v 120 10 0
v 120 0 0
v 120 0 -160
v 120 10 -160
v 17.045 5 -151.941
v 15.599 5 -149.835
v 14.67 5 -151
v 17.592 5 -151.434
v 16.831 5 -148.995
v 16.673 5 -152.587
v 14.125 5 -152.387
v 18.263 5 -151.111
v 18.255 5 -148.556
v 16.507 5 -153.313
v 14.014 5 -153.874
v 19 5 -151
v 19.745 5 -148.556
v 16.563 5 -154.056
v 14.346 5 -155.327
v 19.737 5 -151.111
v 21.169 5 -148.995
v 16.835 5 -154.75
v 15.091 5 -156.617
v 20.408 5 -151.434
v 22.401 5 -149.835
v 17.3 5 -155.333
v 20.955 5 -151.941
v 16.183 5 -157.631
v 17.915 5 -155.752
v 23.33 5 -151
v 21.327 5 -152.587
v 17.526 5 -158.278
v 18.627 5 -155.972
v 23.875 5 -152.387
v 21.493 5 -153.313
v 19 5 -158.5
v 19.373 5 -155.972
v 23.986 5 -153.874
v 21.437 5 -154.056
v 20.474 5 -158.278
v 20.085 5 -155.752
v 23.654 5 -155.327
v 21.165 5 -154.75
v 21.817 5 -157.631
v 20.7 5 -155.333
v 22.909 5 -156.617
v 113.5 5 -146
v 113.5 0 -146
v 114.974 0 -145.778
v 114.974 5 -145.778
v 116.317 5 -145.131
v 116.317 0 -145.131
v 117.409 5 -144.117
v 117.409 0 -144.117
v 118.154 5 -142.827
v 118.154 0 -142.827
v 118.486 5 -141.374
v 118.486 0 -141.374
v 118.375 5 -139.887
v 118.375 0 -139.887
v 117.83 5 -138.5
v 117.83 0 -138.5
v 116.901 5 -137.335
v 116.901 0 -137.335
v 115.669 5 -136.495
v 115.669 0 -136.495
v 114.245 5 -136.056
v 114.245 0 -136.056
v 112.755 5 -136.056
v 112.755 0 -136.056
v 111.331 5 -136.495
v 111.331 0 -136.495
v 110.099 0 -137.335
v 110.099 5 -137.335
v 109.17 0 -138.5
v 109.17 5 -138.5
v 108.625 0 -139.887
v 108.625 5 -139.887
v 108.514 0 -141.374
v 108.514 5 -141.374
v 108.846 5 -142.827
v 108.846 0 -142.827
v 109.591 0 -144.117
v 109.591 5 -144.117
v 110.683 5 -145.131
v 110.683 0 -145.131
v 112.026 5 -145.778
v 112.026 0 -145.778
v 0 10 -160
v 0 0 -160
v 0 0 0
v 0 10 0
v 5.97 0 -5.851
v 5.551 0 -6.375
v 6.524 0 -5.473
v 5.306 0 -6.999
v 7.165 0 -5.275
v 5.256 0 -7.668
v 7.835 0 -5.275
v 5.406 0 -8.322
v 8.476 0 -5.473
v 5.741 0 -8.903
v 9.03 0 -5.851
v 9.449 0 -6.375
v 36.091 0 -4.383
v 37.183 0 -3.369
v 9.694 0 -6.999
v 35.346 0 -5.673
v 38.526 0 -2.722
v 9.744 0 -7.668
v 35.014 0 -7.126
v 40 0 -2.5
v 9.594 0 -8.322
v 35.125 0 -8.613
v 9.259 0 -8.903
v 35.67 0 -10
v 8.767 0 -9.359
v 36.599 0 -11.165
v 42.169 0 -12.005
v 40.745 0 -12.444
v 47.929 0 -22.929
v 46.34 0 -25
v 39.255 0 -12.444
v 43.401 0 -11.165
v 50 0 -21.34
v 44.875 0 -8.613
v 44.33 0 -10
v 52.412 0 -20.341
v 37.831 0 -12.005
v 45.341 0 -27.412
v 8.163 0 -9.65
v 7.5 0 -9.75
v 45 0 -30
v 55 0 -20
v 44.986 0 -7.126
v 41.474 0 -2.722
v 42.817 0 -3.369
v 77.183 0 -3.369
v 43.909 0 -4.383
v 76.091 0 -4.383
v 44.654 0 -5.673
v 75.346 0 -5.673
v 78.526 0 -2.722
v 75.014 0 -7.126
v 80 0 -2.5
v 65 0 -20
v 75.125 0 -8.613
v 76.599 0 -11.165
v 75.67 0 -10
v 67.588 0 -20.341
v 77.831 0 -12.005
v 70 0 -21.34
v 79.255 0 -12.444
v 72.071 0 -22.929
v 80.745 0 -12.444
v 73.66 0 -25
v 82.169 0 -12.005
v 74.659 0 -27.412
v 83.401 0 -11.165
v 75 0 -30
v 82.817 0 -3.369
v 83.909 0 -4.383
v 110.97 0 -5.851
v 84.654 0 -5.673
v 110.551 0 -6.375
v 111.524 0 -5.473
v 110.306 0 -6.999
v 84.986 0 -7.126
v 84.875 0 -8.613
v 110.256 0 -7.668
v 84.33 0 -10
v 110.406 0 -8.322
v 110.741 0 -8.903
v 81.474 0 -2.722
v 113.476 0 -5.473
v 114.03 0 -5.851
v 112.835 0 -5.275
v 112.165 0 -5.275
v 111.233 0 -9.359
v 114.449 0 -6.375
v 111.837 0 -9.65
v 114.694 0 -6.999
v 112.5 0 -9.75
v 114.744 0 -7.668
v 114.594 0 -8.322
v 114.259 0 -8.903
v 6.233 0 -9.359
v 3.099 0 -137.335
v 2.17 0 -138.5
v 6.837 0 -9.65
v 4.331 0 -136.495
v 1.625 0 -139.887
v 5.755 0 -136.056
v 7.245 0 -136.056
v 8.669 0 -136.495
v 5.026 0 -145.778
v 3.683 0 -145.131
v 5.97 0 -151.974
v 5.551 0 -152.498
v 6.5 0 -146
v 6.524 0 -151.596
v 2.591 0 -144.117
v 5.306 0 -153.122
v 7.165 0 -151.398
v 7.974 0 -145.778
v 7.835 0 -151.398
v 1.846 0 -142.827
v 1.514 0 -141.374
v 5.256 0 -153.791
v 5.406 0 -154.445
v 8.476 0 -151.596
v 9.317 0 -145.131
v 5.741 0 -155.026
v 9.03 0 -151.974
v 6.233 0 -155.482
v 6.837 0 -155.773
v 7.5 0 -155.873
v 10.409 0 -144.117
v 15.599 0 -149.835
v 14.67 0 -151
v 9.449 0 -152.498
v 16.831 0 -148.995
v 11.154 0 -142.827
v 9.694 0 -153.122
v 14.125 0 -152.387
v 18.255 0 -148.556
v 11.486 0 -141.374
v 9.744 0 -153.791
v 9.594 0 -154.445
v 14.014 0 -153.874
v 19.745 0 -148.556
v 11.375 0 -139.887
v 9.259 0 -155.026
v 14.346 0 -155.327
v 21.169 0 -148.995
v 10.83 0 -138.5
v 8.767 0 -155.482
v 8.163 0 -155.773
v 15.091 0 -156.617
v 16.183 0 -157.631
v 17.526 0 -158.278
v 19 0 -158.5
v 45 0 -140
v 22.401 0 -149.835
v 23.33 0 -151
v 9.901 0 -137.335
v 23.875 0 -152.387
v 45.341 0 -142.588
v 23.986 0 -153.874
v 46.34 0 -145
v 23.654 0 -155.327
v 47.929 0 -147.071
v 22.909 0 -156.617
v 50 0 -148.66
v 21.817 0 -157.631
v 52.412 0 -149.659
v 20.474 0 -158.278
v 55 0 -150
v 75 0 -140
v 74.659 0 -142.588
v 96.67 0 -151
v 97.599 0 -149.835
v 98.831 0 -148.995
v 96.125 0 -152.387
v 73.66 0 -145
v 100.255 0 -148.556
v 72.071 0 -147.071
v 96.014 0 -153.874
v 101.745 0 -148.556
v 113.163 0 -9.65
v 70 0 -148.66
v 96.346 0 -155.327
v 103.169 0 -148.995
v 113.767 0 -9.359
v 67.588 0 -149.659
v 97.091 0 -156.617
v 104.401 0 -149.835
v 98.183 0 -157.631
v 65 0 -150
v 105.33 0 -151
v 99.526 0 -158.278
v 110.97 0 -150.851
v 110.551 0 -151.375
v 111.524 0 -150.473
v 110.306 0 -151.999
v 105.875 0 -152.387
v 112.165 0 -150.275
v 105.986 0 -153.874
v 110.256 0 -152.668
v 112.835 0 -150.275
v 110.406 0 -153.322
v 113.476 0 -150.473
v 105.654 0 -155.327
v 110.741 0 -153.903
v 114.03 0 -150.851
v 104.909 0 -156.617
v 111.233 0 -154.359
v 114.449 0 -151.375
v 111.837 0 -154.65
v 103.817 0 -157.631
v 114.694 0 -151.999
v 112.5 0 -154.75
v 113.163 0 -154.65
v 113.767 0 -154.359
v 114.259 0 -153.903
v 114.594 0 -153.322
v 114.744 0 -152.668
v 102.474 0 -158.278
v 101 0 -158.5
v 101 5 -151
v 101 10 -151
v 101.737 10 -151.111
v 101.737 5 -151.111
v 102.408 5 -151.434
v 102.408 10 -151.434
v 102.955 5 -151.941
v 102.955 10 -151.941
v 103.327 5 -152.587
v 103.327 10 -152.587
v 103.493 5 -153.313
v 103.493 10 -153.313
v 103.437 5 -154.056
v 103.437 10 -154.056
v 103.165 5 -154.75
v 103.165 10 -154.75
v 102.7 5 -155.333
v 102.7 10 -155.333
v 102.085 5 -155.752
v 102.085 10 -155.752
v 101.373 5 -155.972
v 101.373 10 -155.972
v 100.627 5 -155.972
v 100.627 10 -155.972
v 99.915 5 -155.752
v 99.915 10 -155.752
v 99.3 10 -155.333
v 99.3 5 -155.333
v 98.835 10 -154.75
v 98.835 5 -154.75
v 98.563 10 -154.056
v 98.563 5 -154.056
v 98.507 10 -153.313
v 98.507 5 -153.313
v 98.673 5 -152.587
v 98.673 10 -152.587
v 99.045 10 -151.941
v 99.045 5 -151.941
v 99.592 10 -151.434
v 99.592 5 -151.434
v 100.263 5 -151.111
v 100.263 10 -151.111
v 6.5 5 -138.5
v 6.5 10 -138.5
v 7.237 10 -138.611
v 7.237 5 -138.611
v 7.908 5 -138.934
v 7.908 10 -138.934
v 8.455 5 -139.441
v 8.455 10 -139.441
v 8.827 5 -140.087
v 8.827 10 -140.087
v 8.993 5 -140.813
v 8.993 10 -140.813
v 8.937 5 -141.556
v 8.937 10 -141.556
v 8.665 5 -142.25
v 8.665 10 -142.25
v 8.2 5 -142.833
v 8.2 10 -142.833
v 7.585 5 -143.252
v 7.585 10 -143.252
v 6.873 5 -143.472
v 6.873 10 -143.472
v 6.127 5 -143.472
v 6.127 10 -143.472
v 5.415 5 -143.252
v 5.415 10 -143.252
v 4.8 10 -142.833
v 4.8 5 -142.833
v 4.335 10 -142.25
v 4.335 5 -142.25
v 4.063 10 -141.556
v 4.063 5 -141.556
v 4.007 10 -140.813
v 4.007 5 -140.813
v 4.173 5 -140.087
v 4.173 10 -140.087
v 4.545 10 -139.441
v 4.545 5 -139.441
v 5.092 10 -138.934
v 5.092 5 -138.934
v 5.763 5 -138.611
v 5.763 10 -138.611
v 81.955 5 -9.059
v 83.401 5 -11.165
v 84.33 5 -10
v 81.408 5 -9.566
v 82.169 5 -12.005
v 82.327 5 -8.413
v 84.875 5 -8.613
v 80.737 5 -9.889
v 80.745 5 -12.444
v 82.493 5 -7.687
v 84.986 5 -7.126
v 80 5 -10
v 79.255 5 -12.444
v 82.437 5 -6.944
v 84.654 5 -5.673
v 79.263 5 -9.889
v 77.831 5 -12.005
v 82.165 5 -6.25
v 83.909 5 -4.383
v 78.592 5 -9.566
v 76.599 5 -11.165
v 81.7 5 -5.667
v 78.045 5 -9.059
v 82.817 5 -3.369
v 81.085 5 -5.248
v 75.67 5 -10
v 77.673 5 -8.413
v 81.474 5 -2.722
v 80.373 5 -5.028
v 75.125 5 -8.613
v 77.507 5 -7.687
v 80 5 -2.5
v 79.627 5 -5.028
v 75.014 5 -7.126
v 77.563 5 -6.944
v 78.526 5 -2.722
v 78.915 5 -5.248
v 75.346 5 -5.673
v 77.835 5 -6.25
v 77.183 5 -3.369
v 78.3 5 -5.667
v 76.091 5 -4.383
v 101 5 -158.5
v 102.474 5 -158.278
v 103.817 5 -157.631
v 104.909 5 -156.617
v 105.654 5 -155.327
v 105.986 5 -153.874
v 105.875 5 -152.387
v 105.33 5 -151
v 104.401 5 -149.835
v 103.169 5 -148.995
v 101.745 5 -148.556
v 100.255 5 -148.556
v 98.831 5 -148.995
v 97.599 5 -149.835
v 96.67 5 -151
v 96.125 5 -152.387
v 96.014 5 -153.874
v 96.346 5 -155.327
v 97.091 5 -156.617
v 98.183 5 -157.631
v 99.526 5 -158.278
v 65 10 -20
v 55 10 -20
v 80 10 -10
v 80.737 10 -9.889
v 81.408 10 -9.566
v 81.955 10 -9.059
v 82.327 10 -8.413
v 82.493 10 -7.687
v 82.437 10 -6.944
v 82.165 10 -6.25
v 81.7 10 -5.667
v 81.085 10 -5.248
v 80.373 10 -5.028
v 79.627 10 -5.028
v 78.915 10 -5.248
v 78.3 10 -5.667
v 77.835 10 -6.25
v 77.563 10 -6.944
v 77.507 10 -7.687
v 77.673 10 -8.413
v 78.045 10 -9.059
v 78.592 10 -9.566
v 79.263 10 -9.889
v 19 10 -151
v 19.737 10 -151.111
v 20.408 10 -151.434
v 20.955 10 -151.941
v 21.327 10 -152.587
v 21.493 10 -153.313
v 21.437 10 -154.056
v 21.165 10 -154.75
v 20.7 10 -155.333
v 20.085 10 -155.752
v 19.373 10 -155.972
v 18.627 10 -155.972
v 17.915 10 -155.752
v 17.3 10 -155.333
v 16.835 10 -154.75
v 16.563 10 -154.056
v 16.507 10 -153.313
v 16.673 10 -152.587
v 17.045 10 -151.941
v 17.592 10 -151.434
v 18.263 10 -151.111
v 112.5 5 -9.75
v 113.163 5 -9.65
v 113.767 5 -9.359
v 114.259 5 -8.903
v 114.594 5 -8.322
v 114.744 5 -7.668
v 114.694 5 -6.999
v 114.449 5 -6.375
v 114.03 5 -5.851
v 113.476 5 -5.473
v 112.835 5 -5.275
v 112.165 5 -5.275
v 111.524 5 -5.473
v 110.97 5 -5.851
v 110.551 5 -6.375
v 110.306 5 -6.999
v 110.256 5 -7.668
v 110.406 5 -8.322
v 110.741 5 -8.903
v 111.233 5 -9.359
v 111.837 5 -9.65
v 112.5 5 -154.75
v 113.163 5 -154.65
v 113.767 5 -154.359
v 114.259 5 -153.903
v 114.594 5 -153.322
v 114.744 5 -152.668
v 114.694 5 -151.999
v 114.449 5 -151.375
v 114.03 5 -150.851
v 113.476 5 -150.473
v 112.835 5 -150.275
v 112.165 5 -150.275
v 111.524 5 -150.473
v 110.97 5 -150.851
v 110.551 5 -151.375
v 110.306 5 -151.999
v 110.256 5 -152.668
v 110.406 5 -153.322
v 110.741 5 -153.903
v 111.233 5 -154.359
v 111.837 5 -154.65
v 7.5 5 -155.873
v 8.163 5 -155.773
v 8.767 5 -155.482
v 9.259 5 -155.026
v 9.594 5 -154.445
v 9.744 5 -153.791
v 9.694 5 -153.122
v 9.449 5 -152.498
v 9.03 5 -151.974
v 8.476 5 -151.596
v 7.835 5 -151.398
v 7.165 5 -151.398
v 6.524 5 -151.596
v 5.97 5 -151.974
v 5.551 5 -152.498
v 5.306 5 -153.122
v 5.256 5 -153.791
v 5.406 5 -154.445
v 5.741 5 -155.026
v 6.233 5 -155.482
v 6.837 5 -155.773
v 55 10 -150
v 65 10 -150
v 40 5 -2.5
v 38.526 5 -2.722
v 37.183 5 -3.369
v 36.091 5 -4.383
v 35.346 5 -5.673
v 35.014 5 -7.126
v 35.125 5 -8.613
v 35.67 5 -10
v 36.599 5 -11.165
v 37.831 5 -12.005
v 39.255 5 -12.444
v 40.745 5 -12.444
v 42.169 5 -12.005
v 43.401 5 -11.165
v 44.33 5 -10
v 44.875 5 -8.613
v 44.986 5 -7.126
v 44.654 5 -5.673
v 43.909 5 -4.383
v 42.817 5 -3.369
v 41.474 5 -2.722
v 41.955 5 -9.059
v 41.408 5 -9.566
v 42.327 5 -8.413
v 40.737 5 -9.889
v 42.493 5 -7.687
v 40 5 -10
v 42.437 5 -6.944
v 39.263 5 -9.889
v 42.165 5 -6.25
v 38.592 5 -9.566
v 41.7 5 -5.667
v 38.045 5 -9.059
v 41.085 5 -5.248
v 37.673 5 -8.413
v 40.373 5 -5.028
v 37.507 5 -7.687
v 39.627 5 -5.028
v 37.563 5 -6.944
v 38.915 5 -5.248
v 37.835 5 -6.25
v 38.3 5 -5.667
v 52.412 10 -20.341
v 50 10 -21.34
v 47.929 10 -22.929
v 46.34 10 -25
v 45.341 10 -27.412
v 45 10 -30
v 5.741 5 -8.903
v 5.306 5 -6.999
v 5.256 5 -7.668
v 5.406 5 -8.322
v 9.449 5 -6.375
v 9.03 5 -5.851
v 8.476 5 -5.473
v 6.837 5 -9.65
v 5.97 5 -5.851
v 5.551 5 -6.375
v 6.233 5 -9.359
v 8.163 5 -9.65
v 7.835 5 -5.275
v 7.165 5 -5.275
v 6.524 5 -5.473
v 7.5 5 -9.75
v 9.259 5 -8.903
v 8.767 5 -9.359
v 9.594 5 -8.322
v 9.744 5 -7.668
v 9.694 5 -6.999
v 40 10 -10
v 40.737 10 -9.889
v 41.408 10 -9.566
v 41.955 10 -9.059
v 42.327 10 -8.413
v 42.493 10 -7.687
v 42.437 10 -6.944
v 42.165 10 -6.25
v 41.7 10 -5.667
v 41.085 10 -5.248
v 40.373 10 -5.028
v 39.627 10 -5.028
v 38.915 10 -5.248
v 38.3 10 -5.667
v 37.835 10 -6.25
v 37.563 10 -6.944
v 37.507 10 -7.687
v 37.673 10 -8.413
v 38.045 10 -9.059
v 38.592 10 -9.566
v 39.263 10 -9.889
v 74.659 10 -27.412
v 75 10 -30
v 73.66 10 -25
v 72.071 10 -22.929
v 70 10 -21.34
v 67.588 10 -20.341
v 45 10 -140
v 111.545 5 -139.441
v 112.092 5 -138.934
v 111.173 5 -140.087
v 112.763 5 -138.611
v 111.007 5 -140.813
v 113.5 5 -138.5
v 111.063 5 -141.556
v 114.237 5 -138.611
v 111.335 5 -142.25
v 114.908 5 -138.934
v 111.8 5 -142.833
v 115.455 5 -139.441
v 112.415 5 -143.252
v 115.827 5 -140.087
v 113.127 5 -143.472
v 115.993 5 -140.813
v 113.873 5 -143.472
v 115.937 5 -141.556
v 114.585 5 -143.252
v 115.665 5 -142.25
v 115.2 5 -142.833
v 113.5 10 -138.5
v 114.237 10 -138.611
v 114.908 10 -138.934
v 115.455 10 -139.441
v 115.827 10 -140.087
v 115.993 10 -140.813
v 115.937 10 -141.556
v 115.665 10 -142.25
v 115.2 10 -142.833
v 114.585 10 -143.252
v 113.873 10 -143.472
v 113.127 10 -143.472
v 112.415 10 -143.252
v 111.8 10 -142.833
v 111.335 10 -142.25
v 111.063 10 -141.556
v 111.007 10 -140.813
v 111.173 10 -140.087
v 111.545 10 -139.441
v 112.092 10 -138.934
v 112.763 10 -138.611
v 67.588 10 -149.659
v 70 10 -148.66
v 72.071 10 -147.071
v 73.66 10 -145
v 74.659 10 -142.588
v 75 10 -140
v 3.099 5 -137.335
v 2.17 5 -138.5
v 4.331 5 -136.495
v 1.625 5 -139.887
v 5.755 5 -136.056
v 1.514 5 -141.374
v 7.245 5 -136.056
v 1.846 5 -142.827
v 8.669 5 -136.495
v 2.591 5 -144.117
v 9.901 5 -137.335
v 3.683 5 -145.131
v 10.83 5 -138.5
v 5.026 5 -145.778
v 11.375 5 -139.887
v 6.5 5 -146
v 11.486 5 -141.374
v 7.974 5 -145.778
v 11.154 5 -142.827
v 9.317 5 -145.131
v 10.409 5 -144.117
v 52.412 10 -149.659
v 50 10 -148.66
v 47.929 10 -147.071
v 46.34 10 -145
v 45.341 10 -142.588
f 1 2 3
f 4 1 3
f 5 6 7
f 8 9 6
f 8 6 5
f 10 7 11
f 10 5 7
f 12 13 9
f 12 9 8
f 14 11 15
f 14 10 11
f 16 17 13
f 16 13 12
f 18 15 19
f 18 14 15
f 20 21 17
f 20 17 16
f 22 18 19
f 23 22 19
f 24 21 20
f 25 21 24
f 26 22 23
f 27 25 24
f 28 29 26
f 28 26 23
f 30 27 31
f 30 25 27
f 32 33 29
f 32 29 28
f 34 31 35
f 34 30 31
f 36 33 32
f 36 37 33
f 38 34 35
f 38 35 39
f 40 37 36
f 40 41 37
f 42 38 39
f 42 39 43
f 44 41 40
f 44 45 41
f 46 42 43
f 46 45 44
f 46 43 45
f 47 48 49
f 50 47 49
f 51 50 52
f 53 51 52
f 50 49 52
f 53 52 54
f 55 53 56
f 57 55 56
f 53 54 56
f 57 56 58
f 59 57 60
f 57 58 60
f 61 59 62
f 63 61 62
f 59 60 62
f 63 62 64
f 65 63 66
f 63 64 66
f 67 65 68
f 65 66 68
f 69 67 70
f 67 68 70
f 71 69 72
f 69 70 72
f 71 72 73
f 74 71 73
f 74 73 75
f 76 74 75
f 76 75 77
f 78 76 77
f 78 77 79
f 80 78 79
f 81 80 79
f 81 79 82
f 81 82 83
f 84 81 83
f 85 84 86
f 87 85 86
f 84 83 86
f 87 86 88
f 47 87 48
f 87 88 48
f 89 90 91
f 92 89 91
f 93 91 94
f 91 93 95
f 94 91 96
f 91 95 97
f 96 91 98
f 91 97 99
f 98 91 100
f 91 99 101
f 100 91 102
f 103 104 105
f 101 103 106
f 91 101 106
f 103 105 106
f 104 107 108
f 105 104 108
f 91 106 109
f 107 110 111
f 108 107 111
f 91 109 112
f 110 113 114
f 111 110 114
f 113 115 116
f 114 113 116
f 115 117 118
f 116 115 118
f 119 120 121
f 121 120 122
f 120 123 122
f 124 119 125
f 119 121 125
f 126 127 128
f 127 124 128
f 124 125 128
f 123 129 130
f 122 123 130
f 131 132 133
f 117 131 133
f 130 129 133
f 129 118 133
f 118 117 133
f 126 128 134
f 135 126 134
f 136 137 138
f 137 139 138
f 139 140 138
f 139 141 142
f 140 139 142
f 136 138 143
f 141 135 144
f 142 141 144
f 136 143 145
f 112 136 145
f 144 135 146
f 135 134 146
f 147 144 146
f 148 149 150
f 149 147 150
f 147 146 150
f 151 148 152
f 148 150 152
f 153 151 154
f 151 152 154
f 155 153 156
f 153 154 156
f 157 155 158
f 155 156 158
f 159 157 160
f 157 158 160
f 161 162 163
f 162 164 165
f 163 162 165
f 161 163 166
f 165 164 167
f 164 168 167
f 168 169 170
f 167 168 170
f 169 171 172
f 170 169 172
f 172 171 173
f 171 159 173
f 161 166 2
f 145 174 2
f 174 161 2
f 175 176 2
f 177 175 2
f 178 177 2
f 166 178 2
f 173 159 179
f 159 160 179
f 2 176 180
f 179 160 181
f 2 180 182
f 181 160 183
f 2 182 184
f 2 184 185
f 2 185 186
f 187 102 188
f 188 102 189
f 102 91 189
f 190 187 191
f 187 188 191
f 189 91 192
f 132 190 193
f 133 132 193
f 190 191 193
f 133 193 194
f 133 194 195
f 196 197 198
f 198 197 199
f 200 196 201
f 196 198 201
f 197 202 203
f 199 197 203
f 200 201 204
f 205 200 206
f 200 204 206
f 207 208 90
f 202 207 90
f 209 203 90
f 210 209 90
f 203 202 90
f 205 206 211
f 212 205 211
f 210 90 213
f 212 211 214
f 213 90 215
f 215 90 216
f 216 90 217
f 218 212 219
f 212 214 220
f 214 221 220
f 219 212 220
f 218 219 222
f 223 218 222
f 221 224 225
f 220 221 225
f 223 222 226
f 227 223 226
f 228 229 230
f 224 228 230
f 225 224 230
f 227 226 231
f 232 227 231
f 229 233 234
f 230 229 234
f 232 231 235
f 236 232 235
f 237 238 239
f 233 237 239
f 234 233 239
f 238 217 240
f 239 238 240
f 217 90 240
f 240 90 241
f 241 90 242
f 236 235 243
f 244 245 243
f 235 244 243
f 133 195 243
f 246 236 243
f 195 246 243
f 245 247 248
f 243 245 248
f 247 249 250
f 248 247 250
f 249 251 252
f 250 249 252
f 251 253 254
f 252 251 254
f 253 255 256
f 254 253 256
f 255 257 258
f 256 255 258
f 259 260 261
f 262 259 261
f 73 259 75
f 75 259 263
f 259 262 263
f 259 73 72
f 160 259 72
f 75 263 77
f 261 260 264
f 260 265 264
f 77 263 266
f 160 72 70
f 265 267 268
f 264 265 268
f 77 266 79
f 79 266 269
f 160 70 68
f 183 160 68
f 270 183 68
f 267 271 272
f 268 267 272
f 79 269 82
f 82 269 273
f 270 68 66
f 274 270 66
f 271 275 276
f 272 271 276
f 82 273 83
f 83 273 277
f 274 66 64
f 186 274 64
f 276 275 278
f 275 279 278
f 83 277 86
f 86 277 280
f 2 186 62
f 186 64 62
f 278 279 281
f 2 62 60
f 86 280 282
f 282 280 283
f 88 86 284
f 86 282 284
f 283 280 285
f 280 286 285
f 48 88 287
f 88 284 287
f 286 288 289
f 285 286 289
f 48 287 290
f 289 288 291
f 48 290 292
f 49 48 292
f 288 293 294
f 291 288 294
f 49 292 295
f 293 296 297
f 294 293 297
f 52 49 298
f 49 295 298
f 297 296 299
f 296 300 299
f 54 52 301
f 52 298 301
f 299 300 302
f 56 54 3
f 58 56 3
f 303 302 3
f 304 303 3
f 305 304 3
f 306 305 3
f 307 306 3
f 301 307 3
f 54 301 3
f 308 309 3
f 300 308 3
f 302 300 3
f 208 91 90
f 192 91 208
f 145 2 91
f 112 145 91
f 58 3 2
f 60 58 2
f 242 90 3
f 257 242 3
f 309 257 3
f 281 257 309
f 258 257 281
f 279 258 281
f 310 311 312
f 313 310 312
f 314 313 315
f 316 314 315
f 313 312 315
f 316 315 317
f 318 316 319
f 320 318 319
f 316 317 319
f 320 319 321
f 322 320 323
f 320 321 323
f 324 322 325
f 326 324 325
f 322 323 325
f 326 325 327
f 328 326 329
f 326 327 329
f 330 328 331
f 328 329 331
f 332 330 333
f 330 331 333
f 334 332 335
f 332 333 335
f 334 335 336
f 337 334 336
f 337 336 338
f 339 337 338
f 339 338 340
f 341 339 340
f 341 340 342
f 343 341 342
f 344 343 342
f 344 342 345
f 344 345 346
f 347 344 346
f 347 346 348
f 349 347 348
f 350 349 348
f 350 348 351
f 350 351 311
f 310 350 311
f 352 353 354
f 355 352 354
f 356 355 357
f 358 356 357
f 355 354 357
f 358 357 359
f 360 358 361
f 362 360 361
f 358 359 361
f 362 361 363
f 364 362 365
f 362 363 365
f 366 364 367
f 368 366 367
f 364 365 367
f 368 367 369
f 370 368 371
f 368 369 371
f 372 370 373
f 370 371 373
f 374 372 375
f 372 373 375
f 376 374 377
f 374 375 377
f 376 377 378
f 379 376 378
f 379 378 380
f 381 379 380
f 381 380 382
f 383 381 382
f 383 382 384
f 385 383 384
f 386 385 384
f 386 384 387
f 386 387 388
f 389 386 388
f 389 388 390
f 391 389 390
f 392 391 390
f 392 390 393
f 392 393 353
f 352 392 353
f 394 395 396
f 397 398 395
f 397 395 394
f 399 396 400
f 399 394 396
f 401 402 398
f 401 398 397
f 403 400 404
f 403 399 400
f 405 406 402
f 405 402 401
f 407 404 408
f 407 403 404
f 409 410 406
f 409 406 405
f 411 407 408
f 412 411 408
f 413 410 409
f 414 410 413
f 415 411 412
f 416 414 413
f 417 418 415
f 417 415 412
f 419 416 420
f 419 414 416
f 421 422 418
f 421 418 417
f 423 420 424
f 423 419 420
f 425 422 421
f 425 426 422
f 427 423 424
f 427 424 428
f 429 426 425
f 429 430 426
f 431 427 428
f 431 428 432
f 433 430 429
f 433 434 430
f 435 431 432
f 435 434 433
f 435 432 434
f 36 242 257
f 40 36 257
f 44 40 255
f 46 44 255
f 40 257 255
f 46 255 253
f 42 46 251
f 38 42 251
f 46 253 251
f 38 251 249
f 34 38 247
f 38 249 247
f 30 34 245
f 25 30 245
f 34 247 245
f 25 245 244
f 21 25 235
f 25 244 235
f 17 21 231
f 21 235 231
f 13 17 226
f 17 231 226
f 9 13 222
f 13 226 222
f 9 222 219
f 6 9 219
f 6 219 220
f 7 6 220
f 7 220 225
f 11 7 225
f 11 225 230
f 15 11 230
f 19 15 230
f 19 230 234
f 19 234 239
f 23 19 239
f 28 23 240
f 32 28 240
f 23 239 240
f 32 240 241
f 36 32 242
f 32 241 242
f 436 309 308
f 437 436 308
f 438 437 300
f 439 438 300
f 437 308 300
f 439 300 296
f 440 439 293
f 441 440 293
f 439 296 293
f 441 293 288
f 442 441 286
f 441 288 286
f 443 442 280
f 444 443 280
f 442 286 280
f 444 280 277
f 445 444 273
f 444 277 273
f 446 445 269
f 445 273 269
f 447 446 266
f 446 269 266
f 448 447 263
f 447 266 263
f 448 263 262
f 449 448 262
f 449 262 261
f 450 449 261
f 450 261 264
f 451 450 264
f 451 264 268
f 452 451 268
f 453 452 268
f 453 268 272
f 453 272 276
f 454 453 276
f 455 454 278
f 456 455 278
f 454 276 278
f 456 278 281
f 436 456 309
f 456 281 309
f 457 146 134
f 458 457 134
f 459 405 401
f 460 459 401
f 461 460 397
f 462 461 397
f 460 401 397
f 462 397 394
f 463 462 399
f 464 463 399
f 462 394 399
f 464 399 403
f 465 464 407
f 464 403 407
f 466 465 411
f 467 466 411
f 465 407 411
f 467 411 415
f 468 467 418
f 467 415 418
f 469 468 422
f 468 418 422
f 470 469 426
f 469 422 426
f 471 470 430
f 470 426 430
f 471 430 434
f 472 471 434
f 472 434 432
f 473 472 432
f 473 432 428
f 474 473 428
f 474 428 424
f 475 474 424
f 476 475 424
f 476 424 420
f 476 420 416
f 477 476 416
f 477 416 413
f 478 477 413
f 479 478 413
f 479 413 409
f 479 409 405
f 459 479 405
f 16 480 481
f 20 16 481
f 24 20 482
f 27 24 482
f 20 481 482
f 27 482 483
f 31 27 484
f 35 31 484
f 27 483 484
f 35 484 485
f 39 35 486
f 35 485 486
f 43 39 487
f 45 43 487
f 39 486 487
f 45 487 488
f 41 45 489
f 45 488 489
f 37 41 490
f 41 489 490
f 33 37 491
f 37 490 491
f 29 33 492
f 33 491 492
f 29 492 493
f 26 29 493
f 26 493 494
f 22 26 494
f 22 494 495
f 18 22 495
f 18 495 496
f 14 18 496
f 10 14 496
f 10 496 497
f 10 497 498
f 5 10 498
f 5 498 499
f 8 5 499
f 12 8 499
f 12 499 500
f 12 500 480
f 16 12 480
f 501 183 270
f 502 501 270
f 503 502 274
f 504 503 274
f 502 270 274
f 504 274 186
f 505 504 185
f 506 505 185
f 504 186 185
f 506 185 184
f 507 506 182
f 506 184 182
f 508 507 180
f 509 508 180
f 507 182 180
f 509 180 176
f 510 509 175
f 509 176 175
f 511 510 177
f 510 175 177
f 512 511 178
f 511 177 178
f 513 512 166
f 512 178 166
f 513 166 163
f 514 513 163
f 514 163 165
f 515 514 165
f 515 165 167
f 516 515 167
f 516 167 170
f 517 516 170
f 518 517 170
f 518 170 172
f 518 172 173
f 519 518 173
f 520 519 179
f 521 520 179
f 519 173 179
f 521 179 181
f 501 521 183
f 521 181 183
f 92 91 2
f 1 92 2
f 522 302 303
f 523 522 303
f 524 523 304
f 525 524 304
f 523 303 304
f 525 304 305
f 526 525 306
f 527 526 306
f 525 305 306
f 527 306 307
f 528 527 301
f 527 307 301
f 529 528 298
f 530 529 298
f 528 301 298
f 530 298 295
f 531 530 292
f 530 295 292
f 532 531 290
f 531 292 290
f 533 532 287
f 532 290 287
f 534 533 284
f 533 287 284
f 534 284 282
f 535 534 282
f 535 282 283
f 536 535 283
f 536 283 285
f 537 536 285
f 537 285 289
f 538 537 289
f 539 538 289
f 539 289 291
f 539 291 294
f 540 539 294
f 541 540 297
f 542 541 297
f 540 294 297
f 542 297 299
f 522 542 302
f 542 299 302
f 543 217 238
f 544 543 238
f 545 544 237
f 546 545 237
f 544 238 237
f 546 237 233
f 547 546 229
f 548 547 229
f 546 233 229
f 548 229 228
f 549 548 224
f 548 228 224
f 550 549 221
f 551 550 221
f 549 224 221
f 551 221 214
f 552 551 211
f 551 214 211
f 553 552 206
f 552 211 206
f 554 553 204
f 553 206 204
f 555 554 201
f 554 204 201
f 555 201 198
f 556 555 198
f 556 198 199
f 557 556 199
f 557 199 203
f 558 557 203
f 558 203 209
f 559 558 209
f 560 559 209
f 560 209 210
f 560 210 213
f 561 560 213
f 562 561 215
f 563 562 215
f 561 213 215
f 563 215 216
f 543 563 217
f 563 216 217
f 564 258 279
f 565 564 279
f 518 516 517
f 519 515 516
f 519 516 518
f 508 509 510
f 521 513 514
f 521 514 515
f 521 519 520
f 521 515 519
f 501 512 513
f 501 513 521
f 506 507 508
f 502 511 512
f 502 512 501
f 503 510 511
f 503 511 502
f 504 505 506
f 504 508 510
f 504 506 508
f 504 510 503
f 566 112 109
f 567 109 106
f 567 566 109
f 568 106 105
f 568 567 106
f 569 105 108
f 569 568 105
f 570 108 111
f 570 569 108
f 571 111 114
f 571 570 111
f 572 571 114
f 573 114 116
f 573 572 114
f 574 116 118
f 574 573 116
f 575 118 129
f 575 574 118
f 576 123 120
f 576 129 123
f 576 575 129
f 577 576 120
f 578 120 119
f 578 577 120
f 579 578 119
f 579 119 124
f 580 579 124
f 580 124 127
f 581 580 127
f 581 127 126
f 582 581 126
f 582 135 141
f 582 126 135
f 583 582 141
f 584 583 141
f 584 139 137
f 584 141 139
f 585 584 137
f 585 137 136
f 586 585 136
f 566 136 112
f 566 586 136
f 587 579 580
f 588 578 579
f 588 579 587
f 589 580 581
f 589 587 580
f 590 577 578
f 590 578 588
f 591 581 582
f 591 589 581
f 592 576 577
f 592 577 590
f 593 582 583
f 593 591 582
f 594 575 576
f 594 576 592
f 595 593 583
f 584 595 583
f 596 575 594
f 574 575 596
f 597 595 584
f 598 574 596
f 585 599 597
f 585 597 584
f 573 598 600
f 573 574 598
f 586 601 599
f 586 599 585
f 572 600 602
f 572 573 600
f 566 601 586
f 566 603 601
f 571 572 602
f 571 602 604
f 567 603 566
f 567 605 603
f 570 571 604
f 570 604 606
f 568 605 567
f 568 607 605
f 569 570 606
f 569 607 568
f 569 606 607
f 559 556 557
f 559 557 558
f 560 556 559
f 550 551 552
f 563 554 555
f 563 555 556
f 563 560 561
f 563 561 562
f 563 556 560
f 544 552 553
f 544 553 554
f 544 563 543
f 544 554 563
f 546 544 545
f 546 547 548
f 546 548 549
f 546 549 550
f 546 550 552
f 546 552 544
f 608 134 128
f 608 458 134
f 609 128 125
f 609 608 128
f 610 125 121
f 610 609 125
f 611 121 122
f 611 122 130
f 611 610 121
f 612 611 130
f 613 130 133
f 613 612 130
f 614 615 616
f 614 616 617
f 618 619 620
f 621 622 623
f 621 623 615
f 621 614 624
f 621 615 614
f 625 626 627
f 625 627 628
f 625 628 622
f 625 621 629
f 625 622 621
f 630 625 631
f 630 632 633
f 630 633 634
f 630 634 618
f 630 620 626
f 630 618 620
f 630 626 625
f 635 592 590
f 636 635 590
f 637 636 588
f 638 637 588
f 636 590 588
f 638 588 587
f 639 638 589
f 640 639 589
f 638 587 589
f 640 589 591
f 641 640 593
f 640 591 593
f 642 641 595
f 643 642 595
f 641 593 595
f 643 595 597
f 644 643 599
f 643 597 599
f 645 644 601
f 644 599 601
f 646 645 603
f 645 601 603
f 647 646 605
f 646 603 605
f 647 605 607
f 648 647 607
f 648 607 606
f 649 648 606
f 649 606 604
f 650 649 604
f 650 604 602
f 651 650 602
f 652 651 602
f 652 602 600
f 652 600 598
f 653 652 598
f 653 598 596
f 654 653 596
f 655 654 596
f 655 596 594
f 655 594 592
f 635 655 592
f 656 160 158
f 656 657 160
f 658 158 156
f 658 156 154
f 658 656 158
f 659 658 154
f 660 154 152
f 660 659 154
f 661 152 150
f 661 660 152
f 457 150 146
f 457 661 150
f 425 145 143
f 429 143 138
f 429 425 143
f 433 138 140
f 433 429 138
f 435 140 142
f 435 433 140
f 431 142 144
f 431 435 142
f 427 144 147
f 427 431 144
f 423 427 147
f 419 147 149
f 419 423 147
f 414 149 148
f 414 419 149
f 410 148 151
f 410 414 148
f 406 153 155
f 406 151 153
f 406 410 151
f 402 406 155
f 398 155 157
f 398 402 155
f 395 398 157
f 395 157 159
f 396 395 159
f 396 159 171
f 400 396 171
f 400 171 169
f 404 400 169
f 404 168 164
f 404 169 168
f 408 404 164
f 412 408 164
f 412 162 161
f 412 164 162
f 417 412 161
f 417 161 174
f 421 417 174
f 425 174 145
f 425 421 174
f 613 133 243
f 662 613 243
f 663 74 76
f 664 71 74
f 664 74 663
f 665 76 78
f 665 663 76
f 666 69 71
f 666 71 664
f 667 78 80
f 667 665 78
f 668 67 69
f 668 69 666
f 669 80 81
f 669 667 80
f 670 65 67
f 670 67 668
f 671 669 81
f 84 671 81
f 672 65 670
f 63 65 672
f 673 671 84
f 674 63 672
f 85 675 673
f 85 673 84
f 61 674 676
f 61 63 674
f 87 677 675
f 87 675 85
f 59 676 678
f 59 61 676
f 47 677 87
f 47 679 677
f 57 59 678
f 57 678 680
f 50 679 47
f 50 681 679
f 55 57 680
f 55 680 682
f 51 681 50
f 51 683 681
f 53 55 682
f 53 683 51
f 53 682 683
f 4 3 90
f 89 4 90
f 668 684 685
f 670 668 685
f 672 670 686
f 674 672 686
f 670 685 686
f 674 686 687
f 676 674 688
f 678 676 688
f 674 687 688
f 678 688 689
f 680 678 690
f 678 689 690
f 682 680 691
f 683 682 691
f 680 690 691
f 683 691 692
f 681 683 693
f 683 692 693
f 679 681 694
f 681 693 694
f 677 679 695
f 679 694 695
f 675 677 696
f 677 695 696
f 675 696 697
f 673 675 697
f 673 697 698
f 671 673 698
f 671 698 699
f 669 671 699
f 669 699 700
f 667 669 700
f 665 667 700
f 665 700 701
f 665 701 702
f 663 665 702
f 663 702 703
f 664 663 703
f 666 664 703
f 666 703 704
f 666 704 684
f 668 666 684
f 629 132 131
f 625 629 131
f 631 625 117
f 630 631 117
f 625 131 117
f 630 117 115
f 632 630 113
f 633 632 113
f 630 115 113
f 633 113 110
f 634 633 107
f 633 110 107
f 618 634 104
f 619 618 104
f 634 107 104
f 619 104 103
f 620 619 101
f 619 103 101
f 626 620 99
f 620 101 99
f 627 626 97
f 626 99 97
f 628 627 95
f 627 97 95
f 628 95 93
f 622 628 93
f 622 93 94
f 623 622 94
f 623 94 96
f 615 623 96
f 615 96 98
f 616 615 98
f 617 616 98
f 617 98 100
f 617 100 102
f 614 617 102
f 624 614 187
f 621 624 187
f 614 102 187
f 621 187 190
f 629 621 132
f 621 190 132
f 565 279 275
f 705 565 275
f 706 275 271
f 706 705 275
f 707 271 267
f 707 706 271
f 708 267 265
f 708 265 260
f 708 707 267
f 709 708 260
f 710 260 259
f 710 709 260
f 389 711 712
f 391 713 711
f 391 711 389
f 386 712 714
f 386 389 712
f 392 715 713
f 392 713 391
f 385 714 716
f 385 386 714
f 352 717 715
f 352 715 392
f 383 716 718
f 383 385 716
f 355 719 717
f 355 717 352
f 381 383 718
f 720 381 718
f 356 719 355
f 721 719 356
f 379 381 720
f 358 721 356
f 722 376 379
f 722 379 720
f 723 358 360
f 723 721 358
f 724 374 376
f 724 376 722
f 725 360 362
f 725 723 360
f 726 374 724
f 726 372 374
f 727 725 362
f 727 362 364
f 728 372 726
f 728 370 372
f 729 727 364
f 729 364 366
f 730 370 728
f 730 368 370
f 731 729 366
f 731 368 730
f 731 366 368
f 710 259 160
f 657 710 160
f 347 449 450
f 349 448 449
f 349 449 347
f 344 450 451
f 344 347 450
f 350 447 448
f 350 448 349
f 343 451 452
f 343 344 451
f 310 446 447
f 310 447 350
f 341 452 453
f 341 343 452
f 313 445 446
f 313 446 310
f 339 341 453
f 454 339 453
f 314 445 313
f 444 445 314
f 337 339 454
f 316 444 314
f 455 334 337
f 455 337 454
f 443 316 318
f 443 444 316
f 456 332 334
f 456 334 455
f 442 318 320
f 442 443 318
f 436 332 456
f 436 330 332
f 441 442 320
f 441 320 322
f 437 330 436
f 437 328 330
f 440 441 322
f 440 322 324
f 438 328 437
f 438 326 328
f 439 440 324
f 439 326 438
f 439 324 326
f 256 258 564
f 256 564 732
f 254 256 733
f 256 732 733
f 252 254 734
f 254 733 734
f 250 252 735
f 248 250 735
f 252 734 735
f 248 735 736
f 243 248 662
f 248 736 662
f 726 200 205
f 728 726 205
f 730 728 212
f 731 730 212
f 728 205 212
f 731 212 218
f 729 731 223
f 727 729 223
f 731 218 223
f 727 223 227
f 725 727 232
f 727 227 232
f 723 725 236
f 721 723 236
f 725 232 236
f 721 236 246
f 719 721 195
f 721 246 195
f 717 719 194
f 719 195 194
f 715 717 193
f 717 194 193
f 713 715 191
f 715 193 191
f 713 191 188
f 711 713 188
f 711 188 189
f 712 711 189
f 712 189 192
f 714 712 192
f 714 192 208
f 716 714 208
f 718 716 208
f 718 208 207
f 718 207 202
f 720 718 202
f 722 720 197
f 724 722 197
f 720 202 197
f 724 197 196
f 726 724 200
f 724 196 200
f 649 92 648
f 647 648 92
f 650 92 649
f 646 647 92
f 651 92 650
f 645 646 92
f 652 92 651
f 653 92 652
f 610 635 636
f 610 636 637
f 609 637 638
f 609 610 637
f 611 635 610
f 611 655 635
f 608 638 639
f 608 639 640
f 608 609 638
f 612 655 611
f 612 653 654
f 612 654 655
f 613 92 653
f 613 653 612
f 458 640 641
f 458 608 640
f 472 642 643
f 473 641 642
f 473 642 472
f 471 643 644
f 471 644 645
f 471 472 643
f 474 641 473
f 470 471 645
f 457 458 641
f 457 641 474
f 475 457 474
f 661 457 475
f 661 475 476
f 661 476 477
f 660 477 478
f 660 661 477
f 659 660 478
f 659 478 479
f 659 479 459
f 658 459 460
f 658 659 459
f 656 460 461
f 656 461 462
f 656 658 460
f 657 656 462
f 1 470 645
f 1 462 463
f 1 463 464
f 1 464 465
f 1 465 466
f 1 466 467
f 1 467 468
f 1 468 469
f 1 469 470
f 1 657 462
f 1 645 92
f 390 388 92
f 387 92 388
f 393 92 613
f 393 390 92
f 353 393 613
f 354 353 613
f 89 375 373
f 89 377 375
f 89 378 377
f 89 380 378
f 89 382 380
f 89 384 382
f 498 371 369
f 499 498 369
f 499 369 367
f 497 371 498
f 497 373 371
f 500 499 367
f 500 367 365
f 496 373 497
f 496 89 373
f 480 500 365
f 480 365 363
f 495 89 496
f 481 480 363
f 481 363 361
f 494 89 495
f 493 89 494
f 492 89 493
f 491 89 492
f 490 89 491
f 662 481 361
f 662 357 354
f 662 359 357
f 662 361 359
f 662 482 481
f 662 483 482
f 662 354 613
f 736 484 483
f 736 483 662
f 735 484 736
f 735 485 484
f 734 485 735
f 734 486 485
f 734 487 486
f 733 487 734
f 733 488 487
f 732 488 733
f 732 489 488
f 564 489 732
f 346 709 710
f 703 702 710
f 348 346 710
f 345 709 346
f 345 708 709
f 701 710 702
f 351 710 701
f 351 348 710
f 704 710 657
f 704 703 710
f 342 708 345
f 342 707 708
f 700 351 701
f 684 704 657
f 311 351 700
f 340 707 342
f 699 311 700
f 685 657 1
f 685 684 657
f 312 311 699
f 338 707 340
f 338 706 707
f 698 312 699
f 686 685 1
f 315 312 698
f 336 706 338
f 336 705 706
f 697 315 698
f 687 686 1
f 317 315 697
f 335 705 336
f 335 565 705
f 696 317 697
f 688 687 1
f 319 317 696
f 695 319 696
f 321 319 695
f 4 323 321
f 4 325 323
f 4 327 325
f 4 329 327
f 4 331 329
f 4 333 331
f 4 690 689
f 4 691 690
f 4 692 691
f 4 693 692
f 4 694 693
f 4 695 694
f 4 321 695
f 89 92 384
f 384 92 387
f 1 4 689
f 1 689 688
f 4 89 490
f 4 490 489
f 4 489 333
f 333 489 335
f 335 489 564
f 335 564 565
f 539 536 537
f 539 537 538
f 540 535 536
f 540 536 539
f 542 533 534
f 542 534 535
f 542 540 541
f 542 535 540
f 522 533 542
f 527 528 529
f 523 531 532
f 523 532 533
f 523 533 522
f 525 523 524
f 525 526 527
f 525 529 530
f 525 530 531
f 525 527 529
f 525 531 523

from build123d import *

# Parameters (mm, degrees)
BOSS_EXTRUDE3_DEPTH = 10
FILLET3_R           = 10
SKETCH2_R           = 2.5
CUT_EXTRUDE1_DEPTH  = 100
SKETCH3_R           = 2.5
CUT_EXTRUDE3_DEPTH  = 100
SKETCH4_R           = 5
CUT_EXTRUDE4_DEPTH  = 5
SKETCH5_R           = 2.25
CUT_EXTRUDE7_DEPTH  = 5
SKETCH8_R           = 2.25
CUT_EXTRUDE8_DEPTH  = 5
SKETCH9_R           = 2.25
CUT_EXTRUDE9_DEPTH  = 5
SKETCH10_R          = 5
CUT_EXTRUDE13_DEPTH = 12
SKETCH12_R          = 2.5
CUT_EXTRUDE14_DEPTH = 12


with BuildPart() as part:
    # Sketch1 → Boss-Extrude3 (new body)
    with BuildSketch(Plane(origin=(0, 0, 0), x_dir=(1, 0, 0), z_dir=(0, 1, 0))):
        Polygon((60, 150), (60, 160), (0, 160), (0, 80), (45, 80), (45, 150), align=None)
        Polygon((120, 160), (60, 160), (60, 150), (75, 150), (75, 80), (120, 80), align=None)
        Polygon((120, 0), (120, 80), (75, 80), (75, 20), (60, 20), (60, 0), align=None)
        Polygon((45, 80), (0, 80), (0, 0), (60, 0), (60, 20), (45, 20), align=None)
    extrude(amount=BOSS_EXTRUDE3_DEPTH)

    # Fillet3
    fillet3_edges = [part.edges().sort_by_distance(p)[0] for p in [
        (75, 5, -150),
        (45, 5, -150),
        (45, 5, -20),
        (75, 5, -20),
    ]]
    fillet(fillet3_edges, radius=FILLET3_R)

    # Sketch2 → Cut-Extrude1 (cut)
    with BuildSketch(Plane(origin=(0, 10, 0), x_dir=(1, 0, 0), z_dir=(0, 1, 0))):
        with Locations(Location((19, 153.5, 0), (0, 0, 270))):
            Circle(SKETCH2_R)
        with Locations(Location((6.5, 141, 0), (0, 0, 270))):
            Circle(SKETCH2_R)
    extrude(amount=-CUT_EXTRUDE1_DEPTH, mode=Mode.SUBTRACT)

    # Sketch3 → Cut-Extrude3 (cut)
    with BuildSketch(Plane(origin=(0, 10, 0), x_dir=(1, 0, 0), z_dir=(0, 1, 0))):
        with Locations(Location((113.5, 141, 0), (0, 0, 270))):
            Circle(SKETCH3_R)
        with Locations(Location((101, 153.5, 0), (0, 0, 270))):
            Circle(SKETCH3_R)
    extrude(amount=-CUT_EXTRUDE3_DEPTH, mode=Mode.SUBTRACT)

    # Sketch4 → Cut-Extrude4 (cut)
    with BuildSketch(Plane.XZ):
        with Locations(Location((113.5, -141, 0), (0, 0, 270))):
            Circle(SKETCH4_R)
        with Locations(Location((101, -153.5, 0), (0, 0, 270))):
            Circle(SKETCH4_R)
        with Locations(Location((19, -153.5, 0), (0, 0, 270))):
            Circle(SKETCH4_R)
        with Locations(Location((6.5, -141, 0), (0, 0, 270))):
            Circle(SKETCH4_R)
    extrude(amount=-CUT_EXTRUDE4_DEPTH, mode=Mode.SUBTRACT)

    # Sketch5 → Cut-Extrude7 (cut)
    with BuildSketch(Plane.XZ):
        with Locations(Location((112.5, -152.5, 0), (0, 0, 270))):
            Circle(SKETCH5_R)
    extrude(amount=-CUT_EXTRUDE7_DEPTH, mode=Mode.SUBTRACT)

    # Sketch8 → Cut-Extrude8 (cut)
    with BuildSketch(Plane(origin=(0, 0, 0), x_dir=(-1, 0, 0), z_dir=(0, -1, 0))):
        with Locations(Location((-7.5, 153.623044918, 0), (0, 0, 90))):
            Circle(SKETCH8_R)
    extrude(amount=-CUT_EXTRUDE8_DEPTH, mode=Mode.SUBTRACT)

    # Sketch9 → Cut-Extrude9 (cut)
    with BuildSketch(Plane(origin=(0, 0, 0), x_dir=(-1, 0, 0), z_dir=(0, -1, 0))):
        with Locations(Location((-7.5, 7.5, 0), (0, 0, 90))):
            Circle(SKETCH9_R)
        with Locations(Location((-112.5, 7.5, 0), (0, 0, 90))):
            Circle(SKETCH9_R)
    extrude(amount=-CUT_EXTRUDE9_DEPTH, mode=Mode.SUBTRACT)

    # Sketch10 → Cut-Extrude13 (cut)
    with BuildSketch(Plane(origin=(0, 5, 0), x_dir=(-1, 0, 0), z_dir=(0, -1, 0))):
        with Locations(Location((-80, 7.5, 0), (0, 0, 270))):
            Circle(SKETCH10_R)
        with Locations(Location((-40, 7.5, 0), (0, 0, 270))):
            Circle(SKETCH10_R)
    extrude(amount=CUT_EXTRUDE13_DEPTH, mode=Mode.SUBTRACT)

    # Sketch12 → Cut-Extrude14 (cut)
    with BuildSketch(Plane(origin=(0, 5, 0), x_dir=(-1, 0, 0), z_dir=(0, -1, 0))):
        with Locations(Location((-80, 7.5, 0), (0, 0, 90))):
            Circle(SKETCH12_R)
        with Locations(Location((-40, 7.5, 0), (0, 0, 90))):
            Circle(SKETCH12_R)
    extrude(amount=-CUT_EXTRUDE14_DEPTH, mode=Mode.SUBTRACT)


solid = part.part
